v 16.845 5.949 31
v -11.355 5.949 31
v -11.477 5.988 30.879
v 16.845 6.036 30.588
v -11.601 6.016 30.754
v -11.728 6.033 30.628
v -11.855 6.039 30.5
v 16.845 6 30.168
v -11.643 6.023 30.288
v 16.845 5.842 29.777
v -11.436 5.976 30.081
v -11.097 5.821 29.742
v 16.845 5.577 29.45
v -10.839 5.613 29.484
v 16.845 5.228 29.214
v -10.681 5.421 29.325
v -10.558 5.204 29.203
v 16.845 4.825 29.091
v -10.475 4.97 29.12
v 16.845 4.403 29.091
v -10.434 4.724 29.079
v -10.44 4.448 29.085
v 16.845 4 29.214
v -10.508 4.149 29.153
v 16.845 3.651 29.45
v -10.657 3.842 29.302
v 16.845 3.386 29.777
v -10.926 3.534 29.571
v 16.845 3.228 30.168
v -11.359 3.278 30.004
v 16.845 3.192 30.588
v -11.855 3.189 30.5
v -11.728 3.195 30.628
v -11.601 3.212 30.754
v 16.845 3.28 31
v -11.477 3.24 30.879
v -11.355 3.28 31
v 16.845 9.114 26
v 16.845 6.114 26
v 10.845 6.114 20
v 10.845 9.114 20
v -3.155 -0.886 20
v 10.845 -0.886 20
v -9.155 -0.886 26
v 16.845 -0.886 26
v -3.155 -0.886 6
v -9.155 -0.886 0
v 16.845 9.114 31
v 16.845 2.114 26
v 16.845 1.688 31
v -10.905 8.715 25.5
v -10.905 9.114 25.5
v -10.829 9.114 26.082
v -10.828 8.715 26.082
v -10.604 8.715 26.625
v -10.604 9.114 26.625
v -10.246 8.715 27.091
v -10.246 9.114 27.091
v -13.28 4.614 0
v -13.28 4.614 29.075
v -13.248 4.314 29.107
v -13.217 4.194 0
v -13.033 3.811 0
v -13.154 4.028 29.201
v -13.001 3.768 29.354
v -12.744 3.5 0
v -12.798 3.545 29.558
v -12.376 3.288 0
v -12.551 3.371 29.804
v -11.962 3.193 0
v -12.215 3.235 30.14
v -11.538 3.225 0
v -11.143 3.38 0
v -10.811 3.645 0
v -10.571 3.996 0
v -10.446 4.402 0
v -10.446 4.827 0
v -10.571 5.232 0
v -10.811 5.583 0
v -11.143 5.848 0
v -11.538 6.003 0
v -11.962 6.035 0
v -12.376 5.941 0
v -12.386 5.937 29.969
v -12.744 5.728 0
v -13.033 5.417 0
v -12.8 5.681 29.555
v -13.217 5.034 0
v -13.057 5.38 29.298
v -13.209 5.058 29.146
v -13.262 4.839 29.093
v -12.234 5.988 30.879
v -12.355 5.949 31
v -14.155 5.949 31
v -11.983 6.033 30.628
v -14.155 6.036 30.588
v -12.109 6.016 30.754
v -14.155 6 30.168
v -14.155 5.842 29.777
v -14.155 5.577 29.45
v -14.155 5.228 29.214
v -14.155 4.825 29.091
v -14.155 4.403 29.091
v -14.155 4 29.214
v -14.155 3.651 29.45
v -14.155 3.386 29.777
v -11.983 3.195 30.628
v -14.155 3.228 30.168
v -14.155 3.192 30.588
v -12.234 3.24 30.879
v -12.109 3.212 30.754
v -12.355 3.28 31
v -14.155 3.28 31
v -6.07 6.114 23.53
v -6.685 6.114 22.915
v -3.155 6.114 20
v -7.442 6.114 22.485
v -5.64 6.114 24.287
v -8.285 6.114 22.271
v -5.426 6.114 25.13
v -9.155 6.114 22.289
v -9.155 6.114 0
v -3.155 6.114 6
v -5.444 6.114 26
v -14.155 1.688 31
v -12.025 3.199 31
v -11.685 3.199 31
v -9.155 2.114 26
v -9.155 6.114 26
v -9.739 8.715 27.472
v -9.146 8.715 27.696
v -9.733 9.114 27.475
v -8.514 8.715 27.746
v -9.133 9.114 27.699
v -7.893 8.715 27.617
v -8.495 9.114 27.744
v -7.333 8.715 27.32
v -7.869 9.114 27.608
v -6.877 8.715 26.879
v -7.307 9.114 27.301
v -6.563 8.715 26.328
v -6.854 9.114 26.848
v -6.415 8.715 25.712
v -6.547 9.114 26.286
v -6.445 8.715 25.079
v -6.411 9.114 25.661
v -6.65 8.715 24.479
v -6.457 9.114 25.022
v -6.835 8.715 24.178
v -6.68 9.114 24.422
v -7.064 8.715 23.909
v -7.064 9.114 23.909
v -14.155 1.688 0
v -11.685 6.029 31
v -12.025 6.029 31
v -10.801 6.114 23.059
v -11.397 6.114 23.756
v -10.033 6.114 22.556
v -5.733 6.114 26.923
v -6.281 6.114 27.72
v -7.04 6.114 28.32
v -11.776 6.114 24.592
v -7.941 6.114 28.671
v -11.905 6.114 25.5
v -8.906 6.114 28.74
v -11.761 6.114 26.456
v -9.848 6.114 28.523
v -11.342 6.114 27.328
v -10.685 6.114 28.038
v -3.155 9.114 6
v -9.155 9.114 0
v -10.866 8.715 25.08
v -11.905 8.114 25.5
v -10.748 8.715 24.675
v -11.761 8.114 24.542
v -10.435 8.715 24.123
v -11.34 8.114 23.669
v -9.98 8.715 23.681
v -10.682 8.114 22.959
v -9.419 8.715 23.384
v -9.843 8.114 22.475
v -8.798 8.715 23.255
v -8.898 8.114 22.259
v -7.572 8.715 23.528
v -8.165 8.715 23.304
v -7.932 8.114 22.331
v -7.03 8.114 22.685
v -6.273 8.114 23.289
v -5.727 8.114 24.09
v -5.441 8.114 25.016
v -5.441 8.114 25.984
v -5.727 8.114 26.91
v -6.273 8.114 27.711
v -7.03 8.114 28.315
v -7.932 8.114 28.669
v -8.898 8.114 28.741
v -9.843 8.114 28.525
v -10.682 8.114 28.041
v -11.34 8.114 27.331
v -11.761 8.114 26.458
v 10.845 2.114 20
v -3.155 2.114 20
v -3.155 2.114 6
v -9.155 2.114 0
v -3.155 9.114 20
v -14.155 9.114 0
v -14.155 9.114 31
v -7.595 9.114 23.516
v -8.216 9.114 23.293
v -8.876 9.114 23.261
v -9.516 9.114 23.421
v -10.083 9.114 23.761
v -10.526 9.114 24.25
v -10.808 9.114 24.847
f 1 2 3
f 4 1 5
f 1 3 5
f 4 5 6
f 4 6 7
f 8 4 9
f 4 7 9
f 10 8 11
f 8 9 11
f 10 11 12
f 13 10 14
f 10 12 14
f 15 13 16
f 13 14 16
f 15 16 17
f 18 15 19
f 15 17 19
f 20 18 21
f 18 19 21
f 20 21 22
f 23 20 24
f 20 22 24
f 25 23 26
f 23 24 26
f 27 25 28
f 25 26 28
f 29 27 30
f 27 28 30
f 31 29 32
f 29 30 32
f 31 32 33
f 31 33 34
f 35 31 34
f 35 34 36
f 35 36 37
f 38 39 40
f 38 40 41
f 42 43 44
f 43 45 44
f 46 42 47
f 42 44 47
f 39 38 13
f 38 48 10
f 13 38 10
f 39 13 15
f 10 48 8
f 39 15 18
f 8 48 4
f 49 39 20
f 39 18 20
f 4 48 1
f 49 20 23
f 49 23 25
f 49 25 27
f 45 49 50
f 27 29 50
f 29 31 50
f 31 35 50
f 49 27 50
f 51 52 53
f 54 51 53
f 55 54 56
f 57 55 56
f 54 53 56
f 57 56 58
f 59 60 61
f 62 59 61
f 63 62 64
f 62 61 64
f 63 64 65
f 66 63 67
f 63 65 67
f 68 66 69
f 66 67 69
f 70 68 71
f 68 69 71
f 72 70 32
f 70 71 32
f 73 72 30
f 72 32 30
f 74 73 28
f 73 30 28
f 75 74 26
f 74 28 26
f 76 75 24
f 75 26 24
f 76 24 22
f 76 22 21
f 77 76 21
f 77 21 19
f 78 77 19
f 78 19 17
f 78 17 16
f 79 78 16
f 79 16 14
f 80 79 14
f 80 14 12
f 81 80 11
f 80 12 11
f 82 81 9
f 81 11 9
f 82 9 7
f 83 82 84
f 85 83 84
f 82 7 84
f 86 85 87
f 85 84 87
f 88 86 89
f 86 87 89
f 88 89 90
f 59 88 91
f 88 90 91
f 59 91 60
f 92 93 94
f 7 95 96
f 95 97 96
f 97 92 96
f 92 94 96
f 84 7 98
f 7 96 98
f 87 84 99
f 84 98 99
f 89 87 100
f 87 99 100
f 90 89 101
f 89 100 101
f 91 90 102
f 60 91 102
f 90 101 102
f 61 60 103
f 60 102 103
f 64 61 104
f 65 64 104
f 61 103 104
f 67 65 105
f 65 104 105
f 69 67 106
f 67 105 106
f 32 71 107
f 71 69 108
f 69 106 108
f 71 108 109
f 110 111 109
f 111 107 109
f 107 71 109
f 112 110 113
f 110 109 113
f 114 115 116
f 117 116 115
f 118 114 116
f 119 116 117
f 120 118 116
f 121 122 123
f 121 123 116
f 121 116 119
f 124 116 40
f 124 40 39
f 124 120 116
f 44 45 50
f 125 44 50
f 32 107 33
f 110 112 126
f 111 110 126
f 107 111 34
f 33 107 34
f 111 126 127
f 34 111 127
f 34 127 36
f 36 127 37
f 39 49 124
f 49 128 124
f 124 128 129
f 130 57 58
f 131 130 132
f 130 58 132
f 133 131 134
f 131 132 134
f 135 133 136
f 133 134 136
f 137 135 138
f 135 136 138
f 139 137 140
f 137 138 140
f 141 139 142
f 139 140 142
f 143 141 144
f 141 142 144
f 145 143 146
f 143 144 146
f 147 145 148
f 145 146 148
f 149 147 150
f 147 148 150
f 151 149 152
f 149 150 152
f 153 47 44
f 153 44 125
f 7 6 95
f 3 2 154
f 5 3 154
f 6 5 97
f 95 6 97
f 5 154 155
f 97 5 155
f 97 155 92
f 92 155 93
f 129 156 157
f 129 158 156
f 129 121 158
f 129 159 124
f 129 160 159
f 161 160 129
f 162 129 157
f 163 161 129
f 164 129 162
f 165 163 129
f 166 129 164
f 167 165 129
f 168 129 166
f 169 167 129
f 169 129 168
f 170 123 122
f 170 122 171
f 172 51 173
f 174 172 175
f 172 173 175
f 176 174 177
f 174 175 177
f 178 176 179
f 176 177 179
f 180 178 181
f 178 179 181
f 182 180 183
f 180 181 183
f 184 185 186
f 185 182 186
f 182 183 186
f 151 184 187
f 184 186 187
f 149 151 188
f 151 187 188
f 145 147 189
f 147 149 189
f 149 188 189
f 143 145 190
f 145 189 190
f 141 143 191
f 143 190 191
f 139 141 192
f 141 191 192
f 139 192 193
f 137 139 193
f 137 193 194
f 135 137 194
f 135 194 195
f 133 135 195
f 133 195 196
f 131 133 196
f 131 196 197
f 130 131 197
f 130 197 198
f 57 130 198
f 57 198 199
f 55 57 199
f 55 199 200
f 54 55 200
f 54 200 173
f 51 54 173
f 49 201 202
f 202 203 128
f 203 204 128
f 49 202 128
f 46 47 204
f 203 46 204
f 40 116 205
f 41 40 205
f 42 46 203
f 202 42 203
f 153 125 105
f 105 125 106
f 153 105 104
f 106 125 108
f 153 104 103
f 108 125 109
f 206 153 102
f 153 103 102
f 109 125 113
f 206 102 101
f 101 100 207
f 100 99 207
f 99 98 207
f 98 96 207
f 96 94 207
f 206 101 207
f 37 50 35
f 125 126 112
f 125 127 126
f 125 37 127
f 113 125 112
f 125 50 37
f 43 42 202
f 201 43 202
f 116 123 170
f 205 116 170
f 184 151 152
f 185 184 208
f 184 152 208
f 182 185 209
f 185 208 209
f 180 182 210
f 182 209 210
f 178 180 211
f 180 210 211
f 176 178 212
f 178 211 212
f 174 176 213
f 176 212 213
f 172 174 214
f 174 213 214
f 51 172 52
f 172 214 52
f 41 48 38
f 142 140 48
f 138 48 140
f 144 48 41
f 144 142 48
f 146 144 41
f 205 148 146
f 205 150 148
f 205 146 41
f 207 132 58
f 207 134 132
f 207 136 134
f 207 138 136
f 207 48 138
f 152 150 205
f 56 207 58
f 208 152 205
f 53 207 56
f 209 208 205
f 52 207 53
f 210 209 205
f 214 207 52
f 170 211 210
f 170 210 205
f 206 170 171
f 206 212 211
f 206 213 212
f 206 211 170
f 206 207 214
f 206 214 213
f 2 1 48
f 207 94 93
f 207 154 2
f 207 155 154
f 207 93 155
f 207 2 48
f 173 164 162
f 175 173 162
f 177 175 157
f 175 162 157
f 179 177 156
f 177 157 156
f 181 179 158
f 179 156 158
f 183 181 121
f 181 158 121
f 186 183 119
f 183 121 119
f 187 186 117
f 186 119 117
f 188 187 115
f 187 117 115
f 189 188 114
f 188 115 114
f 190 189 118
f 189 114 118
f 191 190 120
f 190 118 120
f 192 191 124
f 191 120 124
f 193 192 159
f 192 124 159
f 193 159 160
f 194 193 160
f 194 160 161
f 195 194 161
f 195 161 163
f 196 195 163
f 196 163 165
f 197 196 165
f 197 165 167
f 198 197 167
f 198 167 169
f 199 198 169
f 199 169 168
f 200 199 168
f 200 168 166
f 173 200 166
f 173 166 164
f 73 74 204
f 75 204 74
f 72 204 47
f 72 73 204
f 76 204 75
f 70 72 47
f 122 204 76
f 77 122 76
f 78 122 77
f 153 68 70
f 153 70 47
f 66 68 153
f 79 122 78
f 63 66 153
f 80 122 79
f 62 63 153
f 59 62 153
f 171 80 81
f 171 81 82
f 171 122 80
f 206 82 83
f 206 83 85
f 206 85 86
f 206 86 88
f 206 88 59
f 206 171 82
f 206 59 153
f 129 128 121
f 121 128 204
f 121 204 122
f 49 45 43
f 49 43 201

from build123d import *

# Parameters (mm, degrees)
F1_DEPTH      = 20
F2_W          = 7
F2_H          = 20
F3_DEPTH      = 2
F5_DEPTH      = 6
F6_W          = 3
F6_H          = 6
F7_DEPTH      = 25
F8_DEPTH      = 3
F12_DEPTH     = 2
F13_DEPTH     = 11
F14_T4_DEPTH  = 29
F14_T10_DEPTH = 28
F14_T17_DEPTH = 38.2867319519
F14_T24_DEPTH = 39.2867319519
F15_T1_DEPTH  = 61.1449358039
F15_T3_DEPTH  = 60.1449358039
F16_DEPTH     = 1
F17_SIZE      = 6
F20_D         = 2.85
F20_ON_F18_D  = 2.85
F22_DEPTH     = 3
F24_D         = 6.5
F24_DEPTH     = 2
F24_TIP       = 1.9527970118


# Not quite as in the source:
# - a fillet or chamfer that OpenCascade refuses, or shapes differently, is made with other operations: its cross-section is extruded or revolved along the edge and cut away or added


with BuildPart() as f1:
    # F0 (on Top) → F1 (new body)
    with BuildSketch(Plane.XY):
        Polygon((-3.1551690071, 9.1141472052), (-12.1551690071, 9.1141472052), (-12.1551690071, -0.8858527948), (-3.1551690071, -0.8858527948), (-3.1551690071, 2.1141472052), (-9.1551690071, 2.1141472052), (-9.1551690071, 6.1141472052), (-3.1551690071, 6.1141472052), align=None)
    extrude(amount=F1_DEPTH)

    # F2 (on face) → F3 (join)
    with BuildSketch(Plane(origin=(-12.1551690071, 0, 0), x_dir=(0, -1, 0), z_dir=(-1, 0, 0))):
        with Locations((-5.6141472052, 10)):
            Rectangle(F2_W, F2_H)
    extrude(amount=F3_DEPTH)

    # F4 (on face) → F5 (join)
    with BuildSketch(Plane.XY.offset(20)):
        Polygon((-12.1345976368, 9.1141472052), (-12.1551690071, 2.1141472052), (-12.1551690071, -0.8858527948), (-9.1551690071, -0.8858527948), (-9.1551690071, 2.1141472052), (-9.1551690071, 6.1141472052), (-9.1551690071, 9.1141472052), align=None)
    extrude(amount=F5_DEPTH)

    # F6 (on face) → F7 (join)
    with BuildSketch(Plane.YZ.offset(-9.1551690071)):
        with Locations((7.6141472052, 23)):
            Rectangle(F6_W, F6_H)
        with Locations((0.6141472052, 23)):
            Rectangle(F6_W, F6_H)
        Polygon((-0.8858527948, 26), (2.1141472052, 26), (6.1141472052, 26), (9.1141472052, 26), (9.1141472052, 29), (-0.8858527948, 29), align=None)
    extrude(amount=F7_DEPTH)

    # F8 (add): a face of the model
    f8_faces = [f1.faces().sort_by_distance(p)[0] for p in [
        (-10.6515768532, 4.1077318265, 26),
    ]]
    extrude(f8_faces, amount=F8_DEPTH)

    # F9: union 

    # F10: union 

    # F11 (on face) → F12 (join)
    with BuildSketch(Plane.XY.offset(29)):
        Polygon((-12.1345976368, 9.1141472052), (-12.1551690071, 2.1141472052), (15.8448309929, 2.1141472052), (15.8448309929, 9.1141472052), align=None)
    extrude(amount=F12_DEPTH)

    # F4 (on face) → F13 (join)
    with BuildSketch(Plane.XY.offset(20)):
        Polygon((-14.1551690071, 2.1141472052), (-12.1551690071, 2.1141472052), (-12.1345976368, 9.1141472052), (-14.1551690071, 9.1141472052), align=None)
    extrude(amount=F13_DEPTH)

    # F14: chamfer of 4 on 2 edges, made by hand


with BuildPart() as f14_tool2:
    # F14_s3 → F14_t4 (new body)
    with BuildSketch(Plane.XY):
        Polygon((-12.1551690071, -1.8858527948), (-16.1551690071, 2.1141472052), (-12.1551690071, 2.1141472052), align=None)
    extrude(amount=F14_T4_DEPTH)

    split(bisect_by=Plane.XZ.offset(0.8858527948), keep=Keep.BOTTOM)

    split(bisect_by=Plane.YZ.offset(-14.1551690071), keep=Keep.TOP)


with BuildPart() as f1_1:
    add(f1.part)

    # F14_t1: union F14_tool2
    add(f14_tool2.part)


with BuildPart() as f14_tool8:
    # F14_s9 → F14_t10 (new body)
    with BuildSketch(Plane.YZ.offset(-12.1551690071)):
        Polygon((-1.8858527948, 29), (2.1141472052, 33), (2.1141472052, 29), align=None)
    extrude(amount=F14_T10_DEPTH)

    split(bisect_by=Plane.XZ.offset(0.8858527948), keep=Keep.BOTTOM)

    split(bisect_by=Plane.XY.offset(31), keep=Keep.BOTTOM)


with BuildPart() as f1_2:
    add(f1_1.part)

    # F14_t7: union F14_tool8
    add(f14_tool8.part)


with BuildPart() as f14_tool15:
    # F14_s16 → F14_t17 (new body)
    with BuildSketch(Plane.YZ.offset(-22.4419009589)):
        Polygon((-1.8858527948, 29), (2.1141472052, 33), (2.1141472052, 29), align=None)
    extrude(amount=F14_T17_DEPTH)

    split(bisect_by=Plane.XZ.offset(0.8858527948), keep=Keep.BOTTOM)

    split(bisect_by=Plane.YZ.offset(-12.1551690071), keep=Keep.BOTTOM)

    split(bisect_by=Plane.YZ.offset(-14.1551690071), keep=Keep.TOP)

    split(bisect_by=Plane.XY.offset(31), keep=Keep.BOTTOM)


with BuildPart() as f14_tool22:
    # F14_s23 → F14_t24 (new body)
    with BuildSketch(Plane.XY):
        Polygon((-12.1551690071, -1.8858527948), (-16.1551690071, 2.1141472052), (-12.1551690071, 2.1141472052), align=None)
    extrude(amount=F14_T24_DEPTH)

    split(bisect_by=Plane.XZ.offset(0.8858527948), keep=Keep.BOTTOM)

    split(bisect_by=Plane.XY.offset(29), keep=Keep.TOP)

    split(bisect_by=Plane.YZ.offset(-14.1551690071), keep=Keep.TOP)

    split(bisect_by=Plane.XY.offset(31), keep=Keep.BOTTOM)


with BuildPart() as f14_tool15_1:
    add(f14_tool15.part)

    # F14_t29: intersect F14_tool22
    add(f14_tool22.part, mode=Mode.INTERSECT)


with BuildPart() as f1_3:
    add(f1_2.part)

    # F14_t13: union F14_tool15
    add(f14_tool15_1.part)

    # F15: chamfer of 4 x 6 on 2 edges, made by hand

    # F15_s2 → F15_t1 (cut)
    with BuildSketch(Plane.XY.offset(-15.5724679019)):
        Polygon((-9.1551690071, -0.8858527948), (-17.3978096942, 3.3567878923), (-13.1551690071, -0.8858527948), align=None)
    extrude(amount=F15_T1_DEPTH, mode=Mode.SUBTRACT)

    # F15_s4 → F15_t3 (cut)
    with BuildSketch(Plane.YZ.offset(-28.7276369091)):
        Polygon((-0.8858527948, 26), (3.3567878923, 34.2426406871), (-0.8858527948, 30), align=None)
    extrude(amount=F15_T3_DEPTH, mode=Mode.SUBTRACT)

    # F16 (add): a face of the model
    f16_faces = [f1_3.faces().sort_by_distance(p)[0] for p in [
        (15.8448309929, 6.2628078927, 23),
    ]]
    extrude(f16_faces, amount=F16_DEPTH)

    # F17
    f17_edges = [f1_3.edges().sort_by_distance(p)[0] for p in [
        (-3.155169, 0.614147, 0),
        (-3.155169, 7.614147, 0),
        (16.844831, 0.614147, 20),
        (16.844831, 7.614147, 20),
    ]]
    chamfer(f17_edges, length=F17_SIZE)

    # F20 (through all)
    with Locations(Plane(origin=(0, 0, 0), x_dir=(1, 0, 0), z_dir=(0, 0, -1))):
        with Locations((-11.8551690071, -4.6141472052)):
            Hole(F20_D / 2)

    # F20 on F18 (through all)
    with Locations(Plane.YZ.offset(16.8448309929)):
        with Locations((4.6141472052, 30.5)):
            Hole(F20_ON_F18_D / 2)

    # F21 (on face) → F22 (cut)
    with BuildSketch(Plane(origin=(0, 9.1141472052, 0), x_dir=(-1, 0, 0), z_dir=(0, 1, 0))):
        with BuildLine():
            Line((10.2461592647, 27.0909902577), (7.0641787494, 23.9090097423))
            ThreePointArc((7.0641787494, 23.9090097423), (9.5162067299, 23.4212710518), (10.9051690071, 25.5))
            ThreePointArc((10.9051690071, 25.5), (10.7338979552, 26.3610377228), (10.2461592647, 27.0909902577))
        make_face()
        with BuildLine():
            ThreePointArc((10.2461592647, 27.0909902577), (7.0641787494, 27.0909902577), (7.0641787494, 23.9090097423))
            Line((7.0641787494, 23.9090097423), (10.2461592647, 27.0909902577))
        make_face()
    extrude(amount=-F22_DEPTH, mode=Mode.SUBTRACT)

    # F24 (one way)
    with BuildSketch(Plane(origin=(0, 6.1141472052, 0), x_dir=(-1, 0, 0), z_dir=(0, -1, 0))):
        with Locations((8.6551690071, -25.5)):
            Circle(F24_D / 2)
    extrude(amount=-F24_DEPTH, mode=Mode.SUBTRACT)
    with Locations(Plane(origin=(0, 6.1141472052, 0), x_dir=(-1, 0, 0), z_dir=(0, -1, 0))):
        with Locations((8.6551690071, -25.5)):
            with Locations((0, 0, -(F24_DEPTH + F24_TIP / 2))):  # 118° drill point
                Cone(0, F24_D / 2, F24_TIP, mode=Mode.SUBTRACT)


solid = f1_3.part
